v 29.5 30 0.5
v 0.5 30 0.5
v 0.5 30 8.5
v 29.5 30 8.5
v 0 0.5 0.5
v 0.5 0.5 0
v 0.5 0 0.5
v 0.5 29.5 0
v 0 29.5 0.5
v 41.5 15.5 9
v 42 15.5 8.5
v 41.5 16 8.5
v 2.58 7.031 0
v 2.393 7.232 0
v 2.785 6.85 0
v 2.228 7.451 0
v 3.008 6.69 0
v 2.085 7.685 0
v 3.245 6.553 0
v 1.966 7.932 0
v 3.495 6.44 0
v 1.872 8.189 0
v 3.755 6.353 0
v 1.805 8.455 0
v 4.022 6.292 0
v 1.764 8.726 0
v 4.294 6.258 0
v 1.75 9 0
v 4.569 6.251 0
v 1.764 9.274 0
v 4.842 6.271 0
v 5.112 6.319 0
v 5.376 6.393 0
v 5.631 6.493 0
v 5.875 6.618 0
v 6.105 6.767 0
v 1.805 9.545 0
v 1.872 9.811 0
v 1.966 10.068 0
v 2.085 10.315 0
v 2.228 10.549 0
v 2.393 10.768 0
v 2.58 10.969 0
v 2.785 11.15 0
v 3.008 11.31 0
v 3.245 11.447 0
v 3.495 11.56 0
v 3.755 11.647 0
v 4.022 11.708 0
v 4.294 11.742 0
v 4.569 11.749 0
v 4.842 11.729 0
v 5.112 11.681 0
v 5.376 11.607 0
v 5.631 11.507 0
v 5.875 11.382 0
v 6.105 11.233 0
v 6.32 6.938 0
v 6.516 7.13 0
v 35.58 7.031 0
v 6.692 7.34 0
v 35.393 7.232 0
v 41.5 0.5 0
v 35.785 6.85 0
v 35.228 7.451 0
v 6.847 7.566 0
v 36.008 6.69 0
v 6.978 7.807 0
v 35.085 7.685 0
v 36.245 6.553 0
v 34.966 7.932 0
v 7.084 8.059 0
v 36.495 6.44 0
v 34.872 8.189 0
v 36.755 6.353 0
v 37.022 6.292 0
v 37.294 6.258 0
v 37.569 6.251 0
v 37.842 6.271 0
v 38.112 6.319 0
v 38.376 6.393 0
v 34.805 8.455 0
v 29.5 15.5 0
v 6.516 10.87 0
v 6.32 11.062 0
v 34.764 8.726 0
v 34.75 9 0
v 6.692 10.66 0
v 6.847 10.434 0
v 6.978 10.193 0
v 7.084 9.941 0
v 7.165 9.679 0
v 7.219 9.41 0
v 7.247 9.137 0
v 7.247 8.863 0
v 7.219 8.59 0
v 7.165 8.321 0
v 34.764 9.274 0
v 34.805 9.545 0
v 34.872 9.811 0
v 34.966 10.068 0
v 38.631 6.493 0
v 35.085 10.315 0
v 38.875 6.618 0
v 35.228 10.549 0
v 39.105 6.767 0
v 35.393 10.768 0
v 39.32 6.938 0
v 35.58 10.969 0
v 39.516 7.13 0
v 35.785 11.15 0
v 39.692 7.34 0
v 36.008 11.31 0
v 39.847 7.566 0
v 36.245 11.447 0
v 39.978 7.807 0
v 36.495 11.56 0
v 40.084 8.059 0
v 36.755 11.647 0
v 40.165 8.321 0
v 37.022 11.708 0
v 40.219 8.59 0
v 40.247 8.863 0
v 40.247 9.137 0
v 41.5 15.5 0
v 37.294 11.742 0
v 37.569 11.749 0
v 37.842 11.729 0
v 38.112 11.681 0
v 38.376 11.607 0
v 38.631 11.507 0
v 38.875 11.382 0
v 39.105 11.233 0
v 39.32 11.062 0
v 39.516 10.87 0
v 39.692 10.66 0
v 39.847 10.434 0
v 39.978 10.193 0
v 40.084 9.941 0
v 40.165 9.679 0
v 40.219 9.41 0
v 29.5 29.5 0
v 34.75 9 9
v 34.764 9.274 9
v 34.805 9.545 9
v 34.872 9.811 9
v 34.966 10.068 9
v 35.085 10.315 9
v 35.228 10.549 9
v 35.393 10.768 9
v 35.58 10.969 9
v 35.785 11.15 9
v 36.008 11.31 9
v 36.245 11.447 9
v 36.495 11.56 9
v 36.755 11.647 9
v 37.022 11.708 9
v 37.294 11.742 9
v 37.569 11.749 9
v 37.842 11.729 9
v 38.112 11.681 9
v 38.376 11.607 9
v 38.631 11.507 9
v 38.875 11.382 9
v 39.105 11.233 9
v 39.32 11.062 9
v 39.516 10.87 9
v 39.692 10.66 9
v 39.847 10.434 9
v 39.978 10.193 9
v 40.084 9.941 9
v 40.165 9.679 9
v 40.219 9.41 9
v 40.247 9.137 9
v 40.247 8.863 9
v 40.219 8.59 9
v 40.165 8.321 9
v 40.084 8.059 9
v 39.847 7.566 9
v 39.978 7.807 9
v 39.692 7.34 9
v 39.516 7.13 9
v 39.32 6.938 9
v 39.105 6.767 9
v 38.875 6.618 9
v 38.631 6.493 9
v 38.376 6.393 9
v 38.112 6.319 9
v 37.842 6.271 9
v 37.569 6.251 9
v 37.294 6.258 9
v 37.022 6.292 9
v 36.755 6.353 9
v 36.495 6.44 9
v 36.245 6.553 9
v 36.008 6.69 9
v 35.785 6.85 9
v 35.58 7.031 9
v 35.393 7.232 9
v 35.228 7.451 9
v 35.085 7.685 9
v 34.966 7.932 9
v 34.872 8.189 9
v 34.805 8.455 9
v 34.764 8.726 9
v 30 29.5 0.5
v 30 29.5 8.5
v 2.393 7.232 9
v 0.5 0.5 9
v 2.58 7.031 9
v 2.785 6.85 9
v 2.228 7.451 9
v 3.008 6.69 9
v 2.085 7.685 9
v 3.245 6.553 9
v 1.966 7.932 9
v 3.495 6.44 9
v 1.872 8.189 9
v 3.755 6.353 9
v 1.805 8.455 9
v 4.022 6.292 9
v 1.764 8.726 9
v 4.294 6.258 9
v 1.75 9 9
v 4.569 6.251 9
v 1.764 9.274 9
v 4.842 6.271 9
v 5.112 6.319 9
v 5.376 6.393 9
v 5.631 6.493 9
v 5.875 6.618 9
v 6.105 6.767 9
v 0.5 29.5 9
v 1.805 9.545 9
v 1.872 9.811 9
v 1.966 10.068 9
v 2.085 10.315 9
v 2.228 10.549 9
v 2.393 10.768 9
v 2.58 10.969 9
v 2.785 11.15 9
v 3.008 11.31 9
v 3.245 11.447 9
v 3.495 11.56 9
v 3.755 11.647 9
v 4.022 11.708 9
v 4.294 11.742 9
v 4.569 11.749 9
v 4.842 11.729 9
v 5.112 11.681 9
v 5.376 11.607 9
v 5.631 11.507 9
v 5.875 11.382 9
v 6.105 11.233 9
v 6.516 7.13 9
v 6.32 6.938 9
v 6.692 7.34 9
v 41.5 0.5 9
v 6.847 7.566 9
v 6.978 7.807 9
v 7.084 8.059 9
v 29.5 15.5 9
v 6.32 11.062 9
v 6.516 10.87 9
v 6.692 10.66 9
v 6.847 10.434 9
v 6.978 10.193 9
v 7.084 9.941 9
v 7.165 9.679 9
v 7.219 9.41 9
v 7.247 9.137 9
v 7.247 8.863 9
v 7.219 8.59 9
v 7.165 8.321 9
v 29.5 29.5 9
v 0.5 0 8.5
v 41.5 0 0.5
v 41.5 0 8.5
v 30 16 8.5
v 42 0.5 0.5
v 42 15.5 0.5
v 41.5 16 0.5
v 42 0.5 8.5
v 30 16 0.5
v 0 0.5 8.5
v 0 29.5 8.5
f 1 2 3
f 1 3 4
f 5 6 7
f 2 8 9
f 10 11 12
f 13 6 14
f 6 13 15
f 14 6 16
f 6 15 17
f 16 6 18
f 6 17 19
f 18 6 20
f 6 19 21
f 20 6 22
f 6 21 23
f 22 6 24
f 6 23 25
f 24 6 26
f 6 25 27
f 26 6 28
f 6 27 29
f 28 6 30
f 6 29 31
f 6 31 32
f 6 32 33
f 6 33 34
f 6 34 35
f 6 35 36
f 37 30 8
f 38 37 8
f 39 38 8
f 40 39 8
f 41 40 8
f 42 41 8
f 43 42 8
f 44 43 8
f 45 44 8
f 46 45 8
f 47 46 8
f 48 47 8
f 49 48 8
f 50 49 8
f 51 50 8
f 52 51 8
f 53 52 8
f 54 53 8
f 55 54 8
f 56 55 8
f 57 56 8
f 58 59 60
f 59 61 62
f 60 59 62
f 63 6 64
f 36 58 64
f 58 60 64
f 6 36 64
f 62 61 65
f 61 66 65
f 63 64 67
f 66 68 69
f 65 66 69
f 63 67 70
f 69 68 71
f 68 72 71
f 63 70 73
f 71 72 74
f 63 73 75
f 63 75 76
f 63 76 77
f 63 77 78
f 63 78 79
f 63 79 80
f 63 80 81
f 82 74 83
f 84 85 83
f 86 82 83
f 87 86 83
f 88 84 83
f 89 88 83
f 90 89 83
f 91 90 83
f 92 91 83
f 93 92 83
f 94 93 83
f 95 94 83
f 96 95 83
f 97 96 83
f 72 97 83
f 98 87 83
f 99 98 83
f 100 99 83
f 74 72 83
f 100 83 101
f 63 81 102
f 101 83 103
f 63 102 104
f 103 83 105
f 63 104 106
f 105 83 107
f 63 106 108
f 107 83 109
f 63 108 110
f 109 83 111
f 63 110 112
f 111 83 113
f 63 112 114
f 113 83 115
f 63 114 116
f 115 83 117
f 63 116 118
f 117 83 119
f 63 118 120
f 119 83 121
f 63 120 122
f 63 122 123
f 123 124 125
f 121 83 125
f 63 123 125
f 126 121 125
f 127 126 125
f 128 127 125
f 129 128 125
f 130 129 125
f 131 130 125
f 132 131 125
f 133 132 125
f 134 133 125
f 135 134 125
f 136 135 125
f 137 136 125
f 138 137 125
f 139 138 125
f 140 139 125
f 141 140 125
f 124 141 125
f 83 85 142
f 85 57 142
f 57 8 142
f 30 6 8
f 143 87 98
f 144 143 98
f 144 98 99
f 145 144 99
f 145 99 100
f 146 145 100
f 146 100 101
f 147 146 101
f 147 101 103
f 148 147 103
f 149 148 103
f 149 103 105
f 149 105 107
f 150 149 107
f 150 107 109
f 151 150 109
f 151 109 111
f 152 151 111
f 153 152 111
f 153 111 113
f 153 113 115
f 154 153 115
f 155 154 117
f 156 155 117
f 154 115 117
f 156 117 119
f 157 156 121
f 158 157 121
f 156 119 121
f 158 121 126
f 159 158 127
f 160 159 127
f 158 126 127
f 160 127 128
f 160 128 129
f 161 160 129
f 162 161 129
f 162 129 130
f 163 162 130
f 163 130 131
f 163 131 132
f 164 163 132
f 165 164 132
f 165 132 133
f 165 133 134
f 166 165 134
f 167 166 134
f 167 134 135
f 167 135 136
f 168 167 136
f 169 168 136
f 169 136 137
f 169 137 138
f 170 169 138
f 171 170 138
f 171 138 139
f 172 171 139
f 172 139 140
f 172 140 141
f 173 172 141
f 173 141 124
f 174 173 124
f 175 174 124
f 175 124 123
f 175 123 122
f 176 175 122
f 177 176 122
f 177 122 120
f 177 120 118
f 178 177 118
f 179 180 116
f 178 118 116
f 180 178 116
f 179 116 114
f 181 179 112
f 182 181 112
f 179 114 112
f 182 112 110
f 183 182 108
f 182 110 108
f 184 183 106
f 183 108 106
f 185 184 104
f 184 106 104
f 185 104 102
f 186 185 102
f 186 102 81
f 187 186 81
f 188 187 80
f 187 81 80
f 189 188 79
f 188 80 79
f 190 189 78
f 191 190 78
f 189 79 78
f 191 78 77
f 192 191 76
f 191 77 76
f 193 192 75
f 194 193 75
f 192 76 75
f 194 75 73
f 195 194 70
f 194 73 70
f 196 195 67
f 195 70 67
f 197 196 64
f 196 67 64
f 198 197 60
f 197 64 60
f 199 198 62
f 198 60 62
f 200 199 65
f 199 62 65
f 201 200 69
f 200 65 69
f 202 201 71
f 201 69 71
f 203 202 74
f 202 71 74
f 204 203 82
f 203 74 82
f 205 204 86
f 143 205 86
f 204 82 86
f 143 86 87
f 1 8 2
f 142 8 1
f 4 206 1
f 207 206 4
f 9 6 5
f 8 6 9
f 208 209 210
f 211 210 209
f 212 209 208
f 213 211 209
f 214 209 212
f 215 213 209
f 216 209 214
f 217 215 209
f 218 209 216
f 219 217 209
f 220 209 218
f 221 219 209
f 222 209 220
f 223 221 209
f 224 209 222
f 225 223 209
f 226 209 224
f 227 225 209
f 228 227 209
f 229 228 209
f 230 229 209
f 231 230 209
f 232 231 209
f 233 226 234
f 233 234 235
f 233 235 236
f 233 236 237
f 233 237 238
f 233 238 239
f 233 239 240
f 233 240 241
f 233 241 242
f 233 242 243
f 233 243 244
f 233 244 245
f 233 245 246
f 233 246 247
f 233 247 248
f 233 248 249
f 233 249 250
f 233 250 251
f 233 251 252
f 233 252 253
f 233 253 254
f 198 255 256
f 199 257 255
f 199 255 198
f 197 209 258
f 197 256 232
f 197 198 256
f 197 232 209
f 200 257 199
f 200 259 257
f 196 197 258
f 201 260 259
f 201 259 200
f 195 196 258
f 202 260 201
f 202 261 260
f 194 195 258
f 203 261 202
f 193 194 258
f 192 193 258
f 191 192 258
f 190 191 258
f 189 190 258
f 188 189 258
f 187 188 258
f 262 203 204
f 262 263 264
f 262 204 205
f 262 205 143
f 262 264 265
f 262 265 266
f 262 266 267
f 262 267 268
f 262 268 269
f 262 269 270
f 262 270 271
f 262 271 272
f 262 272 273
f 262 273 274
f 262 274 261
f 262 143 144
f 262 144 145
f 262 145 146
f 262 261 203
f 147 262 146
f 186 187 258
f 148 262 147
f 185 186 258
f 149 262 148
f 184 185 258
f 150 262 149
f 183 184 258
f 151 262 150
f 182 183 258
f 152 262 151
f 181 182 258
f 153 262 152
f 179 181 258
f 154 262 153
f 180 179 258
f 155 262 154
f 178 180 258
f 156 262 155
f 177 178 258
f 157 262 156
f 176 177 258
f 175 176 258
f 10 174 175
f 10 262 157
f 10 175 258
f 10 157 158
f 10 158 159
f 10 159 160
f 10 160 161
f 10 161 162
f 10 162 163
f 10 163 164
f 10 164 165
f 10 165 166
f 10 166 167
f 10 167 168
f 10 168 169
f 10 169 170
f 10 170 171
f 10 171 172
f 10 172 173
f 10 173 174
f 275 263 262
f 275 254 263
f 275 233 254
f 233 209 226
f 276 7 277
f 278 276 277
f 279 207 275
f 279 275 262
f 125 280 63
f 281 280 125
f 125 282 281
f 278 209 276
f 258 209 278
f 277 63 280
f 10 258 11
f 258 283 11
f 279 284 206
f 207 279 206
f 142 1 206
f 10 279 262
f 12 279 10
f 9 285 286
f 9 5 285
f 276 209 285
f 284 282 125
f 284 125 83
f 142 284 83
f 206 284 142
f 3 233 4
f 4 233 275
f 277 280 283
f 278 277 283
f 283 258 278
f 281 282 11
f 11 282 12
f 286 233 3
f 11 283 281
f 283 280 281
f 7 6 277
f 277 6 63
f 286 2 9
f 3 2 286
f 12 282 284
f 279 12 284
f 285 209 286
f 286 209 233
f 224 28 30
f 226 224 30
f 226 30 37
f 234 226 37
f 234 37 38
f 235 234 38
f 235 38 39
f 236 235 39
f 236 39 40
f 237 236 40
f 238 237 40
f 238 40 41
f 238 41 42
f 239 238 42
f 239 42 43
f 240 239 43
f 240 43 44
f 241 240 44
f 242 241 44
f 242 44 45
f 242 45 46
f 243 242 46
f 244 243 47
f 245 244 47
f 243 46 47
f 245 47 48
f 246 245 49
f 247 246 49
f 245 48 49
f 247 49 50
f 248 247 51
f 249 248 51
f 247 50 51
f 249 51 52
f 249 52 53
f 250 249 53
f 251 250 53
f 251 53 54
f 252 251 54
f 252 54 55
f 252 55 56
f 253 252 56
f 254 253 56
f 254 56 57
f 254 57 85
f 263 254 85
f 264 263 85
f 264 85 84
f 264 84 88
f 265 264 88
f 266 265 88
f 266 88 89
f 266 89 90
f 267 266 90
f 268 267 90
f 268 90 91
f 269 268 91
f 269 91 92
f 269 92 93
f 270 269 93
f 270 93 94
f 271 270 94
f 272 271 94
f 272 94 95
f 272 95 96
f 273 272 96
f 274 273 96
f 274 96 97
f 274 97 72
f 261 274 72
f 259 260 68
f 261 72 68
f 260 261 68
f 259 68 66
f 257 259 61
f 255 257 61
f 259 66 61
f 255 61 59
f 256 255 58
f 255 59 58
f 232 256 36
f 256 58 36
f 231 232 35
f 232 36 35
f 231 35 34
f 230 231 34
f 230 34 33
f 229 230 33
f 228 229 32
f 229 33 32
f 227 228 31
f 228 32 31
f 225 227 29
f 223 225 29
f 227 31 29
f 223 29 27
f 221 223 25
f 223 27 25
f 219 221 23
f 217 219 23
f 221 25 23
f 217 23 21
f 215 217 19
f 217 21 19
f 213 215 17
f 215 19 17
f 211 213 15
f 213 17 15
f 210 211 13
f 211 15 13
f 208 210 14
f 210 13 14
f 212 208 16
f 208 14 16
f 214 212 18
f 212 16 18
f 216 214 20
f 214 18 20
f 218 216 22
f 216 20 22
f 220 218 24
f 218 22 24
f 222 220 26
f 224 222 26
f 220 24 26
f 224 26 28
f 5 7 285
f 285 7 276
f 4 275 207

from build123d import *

# Parameters (mm, degrees)
SKETCH_1_W          = 42
SKETCH_1_H          = 30
EXTRUDE_1_DEPTH     = 9
SKETCH_2_W          = 12
SKETCH_2_H          = 14
CUT_EXTRUDE_1_DEPTH = 53.39274759
CHAMFER_1_SIZE      = 0.5
SKETCH_3_R          = 2.75
CUT_EXTRUDE_2_DEPTH = 53.39274759


with BuildPart() as part:
    # 草图1 → 凸台-拉伸1 (new body)
    with BuildSketch(Plane.XY):
        with Locations((21, 15)):
            Rectangle(SKETCH_1_W, SKETCH_1_H)
    extrude(amount=EXTRUDE_1_DEPTH)

    # 草图2 → 切除-拉伸1 (cut, through all)
    with BuildSketch(Plane(origin=(0, 0, 0), x_dir=(-1, 0, 0), z_dir=(0, 0, -1))):
        with Locations((-36, 23)):
            Rectangle(SKETCH_2_W, SKETCH_2_H)
    extrude(amount=-CUT_EXTRUDE_1_DEPTH, mode=Mode.SUBTRACT)

    # 倒角1
    chamfer_1_edges = [part.edges().sort_by_distance(p)[0] for p in [
        (42, 8, 9),
        (15, 30, 0),
        (15, 30, 9),
        (42, 16, 4.5),
        (30, 23, 9),
        (30, 30, 4.5),
        (36, 16, 9),
        (36, 16, 0),
        (30, 23, 0),
        (0, 15, 9),
        (42, 8, 0),
        (21, 0, 0),
        (0, 15, 0),
        (21, 0, 9),
        (0, 30, 4.5),
        (42, 0, 4.5),
        (0, 0, 4.5),
    ]]
    chamfer(chamfer_1_edges, length=CHAMFER_1_SIZE)

    # 草图3 → 切除-拉伸2 (cut, through all)
    with BuildSketch(Plane(origin=(0, 0, 0), x_dir=(-1, 0, 0), z_dir=(0, 0, -1))):
        with Locations((-37.5, 9)):
            Circle(SKETCH_3_R)
        with Locations((-4.5, 9)):
            Circle(SKETCH_3_R)
    extrude(amount=-CUT_EXTRUDE_2_DEPTH, mode=Mode.SUBTRACT)


solid = part.part
